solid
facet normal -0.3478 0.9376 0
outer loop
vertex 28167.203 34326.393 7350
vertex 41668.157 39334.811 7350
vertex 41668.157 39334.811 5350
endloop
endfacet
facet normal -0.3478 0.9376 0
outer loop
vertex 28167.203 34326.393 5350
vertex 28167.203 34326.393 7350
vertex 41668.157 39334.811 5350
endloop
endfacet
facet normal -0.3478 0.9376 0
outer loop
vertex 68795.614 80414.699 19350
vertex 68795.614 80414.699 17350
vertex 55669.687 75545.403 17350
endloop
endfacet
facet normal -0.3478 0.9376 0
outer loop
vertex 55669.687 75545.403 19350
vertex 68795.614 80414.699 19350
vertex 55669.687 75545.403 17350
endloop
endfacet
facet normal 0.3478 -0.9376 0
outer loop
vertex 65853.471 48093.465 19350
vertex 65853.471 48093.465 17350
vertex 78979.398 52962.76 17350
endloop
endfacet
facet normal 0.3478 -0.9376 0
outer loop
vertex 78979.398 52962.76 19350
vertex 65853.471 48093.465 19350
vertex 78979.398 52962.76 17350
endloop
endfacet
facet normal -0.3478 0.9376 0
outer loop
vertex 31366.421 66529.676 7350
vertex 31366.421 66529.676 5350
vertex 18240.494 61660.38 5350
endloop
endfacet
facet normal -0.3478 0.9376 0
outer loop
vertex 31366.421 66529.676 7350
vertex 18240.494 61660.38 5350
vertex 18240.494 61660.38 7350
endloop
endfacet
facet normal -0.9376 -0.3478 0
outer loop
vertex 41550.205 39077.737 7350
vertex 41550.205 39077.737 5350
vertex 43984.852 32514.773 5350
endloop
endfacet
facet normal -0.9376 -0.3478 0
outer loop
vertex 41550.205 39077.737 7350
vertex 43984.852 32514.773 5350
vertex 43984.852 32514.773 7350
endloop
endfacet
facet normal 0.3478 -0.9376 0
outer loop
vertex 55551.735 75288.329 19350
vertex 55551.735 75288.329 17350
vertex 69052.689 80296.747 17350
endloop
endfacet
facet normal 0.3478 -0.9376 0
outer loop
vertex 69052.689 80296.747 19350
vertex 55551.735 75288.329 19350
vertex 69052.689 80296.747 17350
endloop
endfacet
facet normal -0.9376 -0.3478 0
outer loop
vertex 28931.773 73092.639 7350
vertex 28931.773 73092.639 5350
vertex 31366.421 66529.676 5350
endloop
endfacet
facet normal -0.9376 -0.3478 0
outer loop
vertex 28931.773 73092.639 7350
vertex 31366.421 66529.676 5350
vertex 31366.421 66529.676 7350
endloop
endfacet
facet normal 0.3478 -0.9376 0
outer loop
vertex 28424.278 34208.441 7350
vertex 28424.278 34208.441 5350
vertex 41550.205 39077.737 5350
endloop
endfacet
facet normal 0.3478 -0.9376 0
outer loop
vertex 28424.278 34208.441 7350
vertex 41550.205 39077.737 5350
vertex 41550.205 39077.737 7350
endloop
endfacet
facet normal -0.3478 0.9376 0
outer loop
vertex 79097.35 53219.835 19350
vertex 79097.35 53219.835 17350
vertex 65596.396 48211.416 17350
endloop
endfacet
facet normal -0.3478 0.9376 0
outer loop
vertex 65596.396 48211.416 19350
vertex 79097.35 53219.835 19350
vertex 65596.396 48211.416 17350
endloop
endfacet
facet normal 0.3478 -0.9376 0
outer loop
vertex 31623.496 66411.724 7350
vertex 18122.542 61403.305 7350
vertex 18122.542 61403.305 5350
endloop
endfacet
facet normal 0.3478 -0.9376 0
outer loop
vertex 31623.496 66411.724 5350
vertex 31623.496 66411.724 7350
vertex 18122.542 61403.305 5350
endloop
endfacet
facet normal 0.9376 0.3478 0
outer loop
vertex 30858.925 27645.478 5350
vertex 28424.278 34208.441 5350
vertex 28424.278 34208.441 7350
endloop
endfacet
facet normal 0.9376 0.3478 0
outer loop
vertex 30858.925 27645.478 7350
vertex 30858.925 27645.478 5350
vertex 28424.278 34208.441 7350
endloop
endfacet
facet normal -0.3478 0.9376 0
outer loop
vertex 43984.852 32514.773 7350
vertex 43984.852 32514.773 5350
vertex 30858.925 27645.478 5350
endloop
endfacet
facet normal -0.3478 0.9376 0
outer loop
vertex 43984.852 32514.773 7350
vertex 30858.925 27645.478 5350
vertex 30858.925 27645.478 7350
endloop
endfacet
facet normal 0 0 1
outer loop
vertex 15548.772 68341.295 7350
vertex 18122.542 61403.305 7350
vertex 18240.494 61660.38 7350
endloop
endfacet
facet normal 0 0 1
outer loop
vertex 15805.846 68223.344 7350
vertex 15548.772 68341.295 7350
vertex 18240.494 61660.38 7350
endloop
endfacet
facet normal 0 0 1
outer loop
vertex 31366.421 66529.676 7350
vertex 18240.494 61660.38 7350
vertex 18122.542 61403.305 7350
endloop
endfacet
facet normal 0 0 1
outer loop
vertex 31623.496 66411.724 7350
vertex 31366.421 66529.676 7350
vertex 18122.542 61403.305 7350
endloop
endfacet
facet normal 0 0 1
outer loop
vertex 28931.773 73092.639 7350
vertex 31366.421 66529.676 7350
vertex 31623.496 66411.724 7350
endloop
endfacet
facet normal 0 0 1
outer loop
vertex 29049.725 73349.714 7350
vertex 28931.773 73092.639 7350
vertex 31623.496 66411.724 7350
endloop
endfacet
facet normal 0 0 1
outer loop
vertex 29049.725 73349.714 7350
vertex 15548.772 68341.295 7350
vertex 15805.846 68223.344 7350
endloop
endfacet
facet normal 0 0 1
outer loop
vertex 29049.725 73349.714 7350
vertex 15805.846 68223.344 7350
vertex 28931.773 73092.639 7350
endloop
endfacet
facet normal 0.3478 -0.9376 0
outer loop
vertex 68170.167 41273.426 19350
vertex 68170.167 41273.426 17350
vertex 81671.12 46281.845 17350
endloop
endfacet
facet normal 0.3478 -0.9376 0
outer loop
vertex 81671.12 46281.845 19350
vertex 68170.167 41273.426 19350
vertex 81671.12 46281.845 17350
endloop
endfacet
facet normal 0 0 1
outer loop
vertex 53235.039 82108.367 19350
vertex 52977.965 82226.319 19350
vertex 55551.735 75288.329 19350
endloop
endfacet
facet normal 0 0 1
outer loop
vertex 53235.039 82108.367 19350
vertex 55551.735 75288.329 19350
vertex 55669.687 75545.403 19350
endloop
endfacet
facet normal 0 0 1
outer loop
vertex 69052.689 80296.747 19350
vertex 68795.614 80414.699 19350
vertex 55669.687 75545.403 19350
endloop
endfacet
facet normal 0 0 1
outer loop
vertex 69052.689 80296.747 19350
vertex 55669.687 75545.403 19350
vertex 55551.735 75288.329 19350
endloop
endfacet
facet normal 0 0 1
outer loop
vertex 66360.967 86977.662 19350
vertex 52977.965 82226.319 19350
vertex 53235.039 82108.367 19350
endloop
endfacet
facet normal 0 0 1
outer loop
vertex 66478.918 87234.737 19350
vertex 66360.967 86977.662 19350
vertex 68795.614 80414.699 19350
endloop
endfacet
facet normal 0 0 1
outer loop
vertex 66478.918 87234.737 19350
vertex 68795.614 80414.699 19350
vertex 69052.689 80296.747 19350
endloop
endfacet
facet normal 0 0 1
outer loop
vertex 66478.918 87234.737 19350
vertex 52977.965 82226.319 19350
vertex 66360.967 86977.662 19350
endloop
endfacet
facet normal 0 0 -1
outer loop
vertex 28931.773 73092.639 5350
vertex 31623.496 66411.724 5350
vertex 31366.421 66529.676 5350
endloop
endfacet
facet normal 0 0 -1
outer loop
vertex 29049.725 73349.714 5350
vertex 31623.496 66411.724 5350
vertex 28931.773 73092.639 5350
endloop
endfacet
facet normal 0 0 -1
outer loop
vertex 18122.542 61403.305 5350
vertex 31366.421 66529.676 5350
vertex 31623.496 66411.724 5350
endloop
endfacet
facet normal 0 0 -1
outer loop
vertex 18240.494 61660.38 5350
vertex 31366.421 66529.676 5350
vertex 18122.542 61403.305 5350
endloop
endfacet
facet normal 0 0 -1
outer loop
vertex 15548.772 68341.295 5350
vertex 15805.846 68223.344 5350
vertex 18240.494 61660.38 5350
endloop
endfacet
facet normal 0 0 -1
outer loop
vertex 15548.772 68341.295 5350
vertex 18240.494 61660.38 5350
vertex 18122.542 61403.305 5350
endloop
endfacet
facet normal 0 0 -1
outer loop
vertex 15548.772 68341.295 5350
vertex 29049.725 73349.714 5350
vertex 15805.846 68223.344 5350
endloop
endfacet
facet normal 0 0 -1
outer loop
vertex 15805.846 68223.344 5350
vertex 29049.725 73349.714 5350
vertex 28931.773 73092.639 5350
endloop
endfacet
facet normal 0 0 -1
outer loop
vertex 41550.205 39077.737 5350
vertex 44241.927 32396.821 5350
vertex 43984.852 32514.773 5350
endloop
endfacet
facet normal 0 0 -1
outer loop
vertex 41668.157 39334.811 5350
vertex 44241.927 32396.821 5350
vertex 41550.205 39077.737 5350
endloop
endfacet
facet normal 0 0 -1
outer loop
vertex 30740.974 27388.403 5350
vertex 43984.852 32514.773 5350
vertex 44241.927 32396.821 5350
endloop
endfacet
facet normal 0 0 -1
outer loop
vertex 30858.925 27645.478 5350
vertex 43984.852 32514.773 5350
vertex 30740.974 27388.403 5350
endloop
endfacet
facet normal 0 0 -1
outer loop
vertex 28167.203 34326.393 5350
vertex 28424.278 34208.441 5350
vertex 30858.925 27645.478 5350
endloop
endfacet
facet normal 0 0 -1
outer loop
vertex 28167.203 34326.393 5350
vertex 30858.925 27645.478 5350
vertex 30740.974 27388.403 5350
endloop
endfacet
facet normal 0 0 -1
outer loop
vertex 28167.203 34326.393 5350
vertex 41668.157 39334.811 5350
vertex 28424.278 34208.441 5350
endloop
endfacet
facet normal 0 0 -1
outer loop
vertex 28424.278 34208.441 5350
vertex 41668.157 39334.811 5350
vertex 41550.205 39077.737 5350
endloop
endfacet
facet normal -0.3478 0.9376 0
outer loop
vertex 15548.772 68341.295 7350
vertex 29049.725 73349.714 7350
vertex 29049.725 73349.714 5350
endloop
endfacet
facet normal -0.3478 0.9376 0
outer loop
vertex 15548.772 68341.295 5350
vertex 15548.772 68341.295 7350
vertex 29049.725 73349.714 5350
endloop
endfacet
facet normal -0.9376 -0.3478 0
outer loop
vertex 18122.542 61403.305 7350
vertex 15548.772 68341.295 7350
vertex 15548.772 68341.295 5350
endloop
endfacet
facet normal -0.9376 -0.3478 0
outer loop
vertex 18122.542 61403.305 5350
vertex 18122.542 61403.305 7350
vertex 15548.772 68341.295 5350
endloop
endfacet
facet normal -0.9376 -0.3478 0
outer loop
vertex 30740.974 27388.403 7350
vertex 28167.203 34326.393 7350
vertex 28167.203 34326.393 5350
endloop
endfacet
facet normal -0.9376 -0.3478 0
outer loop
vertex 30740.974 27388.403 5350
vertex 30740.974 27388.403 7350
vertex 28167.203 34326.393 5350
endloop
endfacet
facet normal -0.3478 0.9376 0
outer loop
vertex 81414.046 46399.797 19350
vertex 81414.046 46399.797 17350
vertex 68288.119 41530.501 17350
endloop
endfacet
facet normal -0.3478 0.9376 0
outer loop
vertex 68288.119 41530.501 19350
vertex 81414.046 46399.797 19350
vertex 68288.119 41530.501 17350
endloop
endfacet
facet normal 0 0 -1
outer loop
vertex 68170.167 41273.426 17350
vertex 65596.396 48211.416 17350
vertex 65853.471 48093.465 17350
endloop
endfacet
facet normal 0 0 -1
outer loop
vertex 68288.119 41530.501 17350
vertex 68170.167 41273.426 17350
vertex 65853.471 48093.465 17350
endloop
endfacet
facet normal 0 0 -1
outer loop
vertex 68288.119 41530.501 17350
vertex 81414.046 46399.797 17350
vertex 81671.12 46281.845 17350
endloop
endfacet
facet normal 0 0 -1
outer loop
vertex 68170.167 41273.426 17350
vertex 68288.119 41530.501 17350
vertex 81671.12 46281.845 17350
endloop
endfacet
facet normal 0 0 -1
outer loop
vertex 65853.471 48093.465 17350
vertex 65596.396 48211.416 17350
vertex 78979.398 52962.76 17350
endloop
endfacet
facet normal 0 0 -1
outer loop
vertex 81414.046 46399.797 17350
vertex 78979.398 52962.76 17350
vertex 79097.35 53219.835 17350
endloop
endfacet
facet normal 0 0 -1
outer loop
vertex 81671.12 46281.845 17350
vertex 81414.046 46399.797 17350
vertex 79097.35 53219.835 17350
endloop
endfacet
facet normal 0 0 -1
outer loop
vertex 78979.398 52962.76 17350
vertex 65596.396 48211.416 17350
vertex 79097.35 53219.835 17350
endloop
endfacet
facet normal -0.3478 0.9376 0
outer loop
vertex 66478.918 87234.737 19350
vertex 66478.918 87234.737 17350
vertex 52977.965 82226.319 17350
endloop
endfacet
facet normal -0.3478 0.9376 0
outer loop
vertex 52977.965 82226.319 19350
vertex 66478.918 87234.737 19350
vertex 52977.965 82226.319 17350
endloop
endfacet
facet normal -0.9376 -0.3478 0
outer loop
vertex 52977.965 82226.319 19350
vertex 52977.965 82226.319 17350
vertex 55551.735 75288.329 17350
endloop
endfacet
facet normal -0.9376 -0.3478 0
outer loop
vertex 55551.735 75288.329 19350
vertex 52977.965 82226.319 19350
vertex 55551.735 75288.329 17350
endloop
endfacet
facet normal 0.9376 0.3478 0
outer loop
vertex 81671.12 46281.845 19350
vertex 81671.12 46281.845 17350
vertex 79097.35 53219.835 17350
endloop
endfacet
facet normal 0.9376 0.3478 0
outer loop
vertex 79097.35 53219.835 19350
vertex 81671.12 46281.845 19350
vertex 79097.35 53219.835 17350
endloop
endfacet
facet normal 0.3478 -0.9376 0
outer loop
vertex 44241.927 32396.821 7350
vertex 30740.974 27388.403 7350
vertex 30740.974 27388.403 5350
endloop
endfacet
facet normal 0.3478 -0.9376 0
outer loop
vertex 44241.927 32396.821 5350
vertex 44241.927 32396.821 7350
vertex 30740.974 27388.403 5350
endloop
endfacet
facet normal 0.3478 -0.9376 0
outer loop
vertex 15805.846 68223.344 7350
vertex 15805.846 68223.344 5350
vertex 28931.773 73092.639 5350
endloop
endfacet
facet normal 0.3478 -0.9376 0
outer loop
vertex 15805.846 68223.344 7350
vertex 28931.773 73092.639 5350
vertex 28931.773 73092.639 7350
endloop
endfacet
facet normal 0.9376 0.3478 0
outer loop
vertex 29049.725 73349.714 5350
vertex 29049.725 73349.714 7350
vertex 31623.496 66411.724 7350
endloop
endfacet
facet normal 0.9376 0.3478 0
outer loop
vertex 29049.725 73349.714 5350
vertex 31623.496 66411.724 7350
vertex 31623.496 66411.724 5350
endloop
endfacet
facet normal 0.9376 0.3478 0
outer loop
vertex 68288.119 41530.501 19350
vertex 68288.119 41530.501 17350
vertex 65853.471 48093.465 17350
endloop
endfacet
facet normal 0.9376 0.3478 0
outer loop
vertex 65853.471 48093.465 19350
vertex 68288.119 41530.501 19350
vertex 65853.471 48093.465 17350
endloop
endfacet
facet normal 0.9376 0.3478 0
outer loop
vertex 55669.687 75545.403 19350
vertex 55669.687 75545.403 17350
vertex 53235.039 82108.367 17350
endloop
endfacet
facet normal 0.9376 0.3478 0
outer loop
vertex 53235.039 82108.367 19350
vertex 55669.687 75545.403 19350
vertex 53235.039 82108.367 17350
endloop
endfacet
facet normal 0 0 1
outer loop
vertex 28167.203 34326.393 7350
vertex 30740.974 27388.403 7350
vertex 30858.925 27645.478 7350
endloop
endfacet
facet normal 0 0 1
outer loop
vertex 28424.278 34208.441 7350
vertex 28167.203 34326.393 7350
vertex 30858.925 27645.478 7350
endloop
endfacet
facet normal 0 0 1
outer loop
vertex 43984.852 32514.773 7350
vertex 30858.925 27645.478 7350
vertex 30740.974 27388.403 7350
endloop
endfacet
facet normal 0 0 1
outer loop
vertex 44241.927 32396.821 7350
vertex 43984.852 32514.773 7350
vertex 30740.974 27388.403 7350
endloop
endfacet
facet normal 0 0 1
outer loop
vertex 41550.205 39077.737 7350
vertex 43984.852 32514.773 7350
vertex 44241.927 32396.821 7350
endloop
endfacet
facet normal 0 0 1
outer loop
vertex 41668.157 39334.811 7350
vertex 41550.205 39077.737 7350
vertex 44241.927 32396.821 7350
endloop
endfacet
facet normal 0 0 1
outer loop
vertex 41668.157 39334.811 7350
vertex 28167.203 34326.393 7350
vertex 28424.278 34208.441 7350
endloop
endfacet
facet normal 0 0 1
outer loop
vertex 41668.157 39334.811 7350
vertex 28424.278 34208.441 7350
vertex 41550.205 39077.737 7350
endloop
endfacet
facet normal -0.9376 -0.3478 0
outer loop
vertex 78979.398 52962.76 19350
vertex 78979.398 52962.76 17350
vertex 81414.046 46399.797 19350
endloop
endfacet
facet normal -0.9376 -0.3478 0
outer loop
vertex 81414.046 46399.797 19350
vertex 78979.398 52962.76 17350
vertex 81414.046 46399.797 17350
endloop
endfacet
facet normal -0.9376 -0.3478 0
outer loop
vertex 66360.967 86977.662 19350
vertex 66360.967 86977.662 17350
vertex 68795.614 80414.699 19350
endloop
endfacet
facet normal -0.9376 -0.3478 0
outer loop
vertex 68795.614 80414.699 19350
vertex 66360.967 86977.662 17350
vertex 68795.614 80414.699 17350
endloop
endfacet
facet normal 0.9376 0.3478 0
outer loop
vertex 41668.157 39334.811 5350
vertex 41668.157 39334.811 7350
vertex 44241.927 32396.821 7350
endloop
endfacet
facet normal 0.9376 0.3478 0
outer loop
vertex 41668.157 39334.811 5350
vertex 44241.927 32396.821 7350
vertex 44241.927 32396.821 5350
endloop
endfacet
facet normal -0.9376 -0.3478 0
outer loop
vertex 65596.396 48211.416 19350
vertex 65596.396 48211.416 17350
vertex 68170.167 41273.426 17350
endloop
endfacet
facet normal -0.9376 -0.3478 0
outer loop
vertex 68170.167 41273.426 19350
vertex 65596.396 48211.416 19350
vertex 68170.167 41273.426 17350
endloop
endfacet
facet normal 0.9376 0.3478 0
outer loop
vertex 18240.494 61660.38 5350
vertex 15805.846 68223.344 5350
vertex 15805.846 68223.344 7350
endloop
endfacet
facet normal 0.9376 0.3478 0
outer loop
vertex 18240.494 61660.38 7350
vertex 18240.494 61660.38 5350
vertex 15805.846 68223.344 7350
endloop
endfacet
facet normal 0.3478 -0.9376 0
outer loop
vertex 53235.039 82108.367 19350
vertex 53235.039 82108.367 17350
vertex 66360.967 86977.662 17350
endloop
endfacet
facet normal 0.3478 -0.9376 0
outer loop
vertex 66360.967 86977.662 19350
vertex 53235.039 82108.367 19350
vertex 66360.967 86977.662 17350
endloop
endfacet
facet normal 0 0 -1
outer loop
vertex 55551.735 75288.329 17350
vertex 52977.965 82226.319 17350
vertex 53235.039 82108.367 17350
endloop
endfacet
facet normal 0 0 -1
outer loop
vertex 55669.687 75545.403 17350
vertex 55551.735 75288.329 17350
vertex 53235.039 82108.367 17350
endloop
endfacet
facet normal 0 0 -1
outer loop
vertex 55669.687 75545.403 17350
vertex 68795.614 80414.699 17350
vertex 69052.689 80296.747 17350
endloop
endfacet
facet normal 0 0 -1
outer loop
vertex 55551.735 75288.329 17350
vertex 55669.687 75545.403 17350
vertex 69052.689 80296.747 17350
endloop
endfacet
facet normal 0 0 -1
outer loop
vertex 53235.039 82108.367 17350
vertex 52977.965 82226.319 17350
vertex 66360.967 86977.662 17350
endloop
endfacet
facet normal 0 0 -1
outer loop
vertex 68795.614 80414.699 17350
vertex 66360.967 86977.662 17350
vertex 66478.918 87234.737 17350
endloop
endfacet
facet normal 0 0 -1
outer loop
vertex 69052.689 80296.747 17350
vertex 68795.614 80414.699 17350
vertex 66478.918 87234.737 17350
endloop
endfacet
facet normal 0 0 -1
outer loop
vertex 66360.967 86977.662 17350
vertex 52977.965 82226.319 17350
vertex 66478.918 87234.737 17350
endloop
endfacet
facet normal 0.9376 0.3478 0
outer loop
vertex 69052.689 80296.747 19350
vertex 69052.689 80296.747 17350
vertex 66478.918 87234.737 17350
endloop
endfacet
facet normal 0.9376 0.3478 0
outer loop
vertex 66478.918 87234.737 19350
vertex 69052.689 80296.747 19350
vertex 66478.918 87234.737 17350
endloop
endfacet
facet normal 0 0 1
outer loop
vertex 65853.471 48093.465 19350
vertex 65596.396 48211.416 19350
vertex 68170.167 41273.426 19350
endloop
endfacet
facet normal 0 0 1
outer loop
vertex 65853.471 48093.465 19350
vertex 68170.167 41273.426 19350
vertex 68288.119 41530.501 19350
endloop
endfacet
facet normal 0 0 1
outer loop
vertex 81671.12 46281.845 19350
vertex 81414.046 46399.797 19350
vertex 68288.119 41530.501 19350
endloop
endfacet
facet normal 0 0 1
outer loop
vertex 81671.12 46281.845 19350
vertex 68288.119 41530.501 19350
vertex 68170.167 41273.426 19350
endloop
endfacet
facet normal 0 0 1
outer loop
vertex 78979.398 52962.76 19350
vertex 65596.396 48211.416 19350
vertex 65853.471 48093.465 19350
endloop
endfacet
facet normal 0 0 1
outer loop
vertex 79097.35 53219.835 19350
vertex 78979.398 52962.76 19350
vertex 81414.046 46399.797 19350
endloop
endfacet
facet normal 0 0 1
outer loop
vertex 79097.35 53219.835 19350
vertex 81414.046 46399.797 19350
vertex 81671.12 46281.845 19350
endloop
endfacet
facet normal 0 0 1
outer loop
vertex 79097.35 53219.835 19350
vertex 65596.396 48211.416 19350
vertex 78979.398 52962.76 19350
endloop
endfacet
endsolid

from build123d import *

# Parameters (mm, degrees)
SKETCH1_W       = 200
SKETCH1_H       = 2000
SWEEP6_START    = 17350
SWEEP6_DEPTH    = 2000
LPATTERN1_COUNT = 2
LPATTERN1_PITCH = 36280


# Read off the part's stored shape, not the designer's step: Sweep6
with BuildPart() as part:
    # Sweep1: sweep along a curve in space
    with BuildLine() as sweep1_path:
        Line((43984.852479613, 32514.773197836, 6350), (41550.204718904, 39077.736726706, 6350))
        Line((41550.204718904, 39077.736726706, 6350), (28424.277661165, 34208.441205286, 6350))
        Line((28424.277661165, 34208.441205286, 6350), (30858.925421874, 27645.477676417, 6350))
        Line((43984.852479613, 32514.773197836, 6350), (30858.925421874, 27645.477676417, 6350))
    # Sketch1 → Sweep1 (sweep)
    with BuildSketch(Plane(origin=(-5281.975673085, 14238.369205706, 0), x_dir=(0.93756621840993, 0.34780682295852583, 0), z_dir=(0.34780682295852583, -0.93756621840993, 0))):
        with Locations((38447.571771786, 6350)):
            Rectangle(SKETCH1_W, SKETCH1_H)
    sweep(path=sweep1_path.line, transition=Transition.RIGHT)


with BuildPart() as body_2:
    # Sweep6 outline → Sweep6 (new body)
    with BuildSketch(Plane.XY.offset(SWEEP6_START)):
        Polygon((81671.120440358, 46281.844659179), (79097.349950465, 53219.834675412), (65596.396405362, 48211.41642481), (68170.166895255, 41273.426408576), align=None)
        Polygon((78979.398071375, 52962.760067139), (81414.045832085, 46399.796538269), (68288.118774346, 41530.50101685), (65853.471013636, 48093.464545719), align=None, mode=Mode.SUBTRACT)
    extrude(amount=SWEEP6_DEPTH)


with BuildPart() as lpattern1_1:
    # LPattern1: pattern copy
    add(body_2.part.moved(Location(Vector(-0.34780682295852905, 0.9375662184099289, 0) * (1 * LPATTERN1_PITCH))))


with BuildPart() as lpattern1_2:
    # LPattern1: pattern copy
    add(part.part.moved(Location(Vector(-0.34780682295852905, 0.9375662184099289, 0) * (1 * LPATTERN1_PITCH))))


solid = Compound([part.part, body_2.part, lpattern1_1.part, lpattern1_2.part])
